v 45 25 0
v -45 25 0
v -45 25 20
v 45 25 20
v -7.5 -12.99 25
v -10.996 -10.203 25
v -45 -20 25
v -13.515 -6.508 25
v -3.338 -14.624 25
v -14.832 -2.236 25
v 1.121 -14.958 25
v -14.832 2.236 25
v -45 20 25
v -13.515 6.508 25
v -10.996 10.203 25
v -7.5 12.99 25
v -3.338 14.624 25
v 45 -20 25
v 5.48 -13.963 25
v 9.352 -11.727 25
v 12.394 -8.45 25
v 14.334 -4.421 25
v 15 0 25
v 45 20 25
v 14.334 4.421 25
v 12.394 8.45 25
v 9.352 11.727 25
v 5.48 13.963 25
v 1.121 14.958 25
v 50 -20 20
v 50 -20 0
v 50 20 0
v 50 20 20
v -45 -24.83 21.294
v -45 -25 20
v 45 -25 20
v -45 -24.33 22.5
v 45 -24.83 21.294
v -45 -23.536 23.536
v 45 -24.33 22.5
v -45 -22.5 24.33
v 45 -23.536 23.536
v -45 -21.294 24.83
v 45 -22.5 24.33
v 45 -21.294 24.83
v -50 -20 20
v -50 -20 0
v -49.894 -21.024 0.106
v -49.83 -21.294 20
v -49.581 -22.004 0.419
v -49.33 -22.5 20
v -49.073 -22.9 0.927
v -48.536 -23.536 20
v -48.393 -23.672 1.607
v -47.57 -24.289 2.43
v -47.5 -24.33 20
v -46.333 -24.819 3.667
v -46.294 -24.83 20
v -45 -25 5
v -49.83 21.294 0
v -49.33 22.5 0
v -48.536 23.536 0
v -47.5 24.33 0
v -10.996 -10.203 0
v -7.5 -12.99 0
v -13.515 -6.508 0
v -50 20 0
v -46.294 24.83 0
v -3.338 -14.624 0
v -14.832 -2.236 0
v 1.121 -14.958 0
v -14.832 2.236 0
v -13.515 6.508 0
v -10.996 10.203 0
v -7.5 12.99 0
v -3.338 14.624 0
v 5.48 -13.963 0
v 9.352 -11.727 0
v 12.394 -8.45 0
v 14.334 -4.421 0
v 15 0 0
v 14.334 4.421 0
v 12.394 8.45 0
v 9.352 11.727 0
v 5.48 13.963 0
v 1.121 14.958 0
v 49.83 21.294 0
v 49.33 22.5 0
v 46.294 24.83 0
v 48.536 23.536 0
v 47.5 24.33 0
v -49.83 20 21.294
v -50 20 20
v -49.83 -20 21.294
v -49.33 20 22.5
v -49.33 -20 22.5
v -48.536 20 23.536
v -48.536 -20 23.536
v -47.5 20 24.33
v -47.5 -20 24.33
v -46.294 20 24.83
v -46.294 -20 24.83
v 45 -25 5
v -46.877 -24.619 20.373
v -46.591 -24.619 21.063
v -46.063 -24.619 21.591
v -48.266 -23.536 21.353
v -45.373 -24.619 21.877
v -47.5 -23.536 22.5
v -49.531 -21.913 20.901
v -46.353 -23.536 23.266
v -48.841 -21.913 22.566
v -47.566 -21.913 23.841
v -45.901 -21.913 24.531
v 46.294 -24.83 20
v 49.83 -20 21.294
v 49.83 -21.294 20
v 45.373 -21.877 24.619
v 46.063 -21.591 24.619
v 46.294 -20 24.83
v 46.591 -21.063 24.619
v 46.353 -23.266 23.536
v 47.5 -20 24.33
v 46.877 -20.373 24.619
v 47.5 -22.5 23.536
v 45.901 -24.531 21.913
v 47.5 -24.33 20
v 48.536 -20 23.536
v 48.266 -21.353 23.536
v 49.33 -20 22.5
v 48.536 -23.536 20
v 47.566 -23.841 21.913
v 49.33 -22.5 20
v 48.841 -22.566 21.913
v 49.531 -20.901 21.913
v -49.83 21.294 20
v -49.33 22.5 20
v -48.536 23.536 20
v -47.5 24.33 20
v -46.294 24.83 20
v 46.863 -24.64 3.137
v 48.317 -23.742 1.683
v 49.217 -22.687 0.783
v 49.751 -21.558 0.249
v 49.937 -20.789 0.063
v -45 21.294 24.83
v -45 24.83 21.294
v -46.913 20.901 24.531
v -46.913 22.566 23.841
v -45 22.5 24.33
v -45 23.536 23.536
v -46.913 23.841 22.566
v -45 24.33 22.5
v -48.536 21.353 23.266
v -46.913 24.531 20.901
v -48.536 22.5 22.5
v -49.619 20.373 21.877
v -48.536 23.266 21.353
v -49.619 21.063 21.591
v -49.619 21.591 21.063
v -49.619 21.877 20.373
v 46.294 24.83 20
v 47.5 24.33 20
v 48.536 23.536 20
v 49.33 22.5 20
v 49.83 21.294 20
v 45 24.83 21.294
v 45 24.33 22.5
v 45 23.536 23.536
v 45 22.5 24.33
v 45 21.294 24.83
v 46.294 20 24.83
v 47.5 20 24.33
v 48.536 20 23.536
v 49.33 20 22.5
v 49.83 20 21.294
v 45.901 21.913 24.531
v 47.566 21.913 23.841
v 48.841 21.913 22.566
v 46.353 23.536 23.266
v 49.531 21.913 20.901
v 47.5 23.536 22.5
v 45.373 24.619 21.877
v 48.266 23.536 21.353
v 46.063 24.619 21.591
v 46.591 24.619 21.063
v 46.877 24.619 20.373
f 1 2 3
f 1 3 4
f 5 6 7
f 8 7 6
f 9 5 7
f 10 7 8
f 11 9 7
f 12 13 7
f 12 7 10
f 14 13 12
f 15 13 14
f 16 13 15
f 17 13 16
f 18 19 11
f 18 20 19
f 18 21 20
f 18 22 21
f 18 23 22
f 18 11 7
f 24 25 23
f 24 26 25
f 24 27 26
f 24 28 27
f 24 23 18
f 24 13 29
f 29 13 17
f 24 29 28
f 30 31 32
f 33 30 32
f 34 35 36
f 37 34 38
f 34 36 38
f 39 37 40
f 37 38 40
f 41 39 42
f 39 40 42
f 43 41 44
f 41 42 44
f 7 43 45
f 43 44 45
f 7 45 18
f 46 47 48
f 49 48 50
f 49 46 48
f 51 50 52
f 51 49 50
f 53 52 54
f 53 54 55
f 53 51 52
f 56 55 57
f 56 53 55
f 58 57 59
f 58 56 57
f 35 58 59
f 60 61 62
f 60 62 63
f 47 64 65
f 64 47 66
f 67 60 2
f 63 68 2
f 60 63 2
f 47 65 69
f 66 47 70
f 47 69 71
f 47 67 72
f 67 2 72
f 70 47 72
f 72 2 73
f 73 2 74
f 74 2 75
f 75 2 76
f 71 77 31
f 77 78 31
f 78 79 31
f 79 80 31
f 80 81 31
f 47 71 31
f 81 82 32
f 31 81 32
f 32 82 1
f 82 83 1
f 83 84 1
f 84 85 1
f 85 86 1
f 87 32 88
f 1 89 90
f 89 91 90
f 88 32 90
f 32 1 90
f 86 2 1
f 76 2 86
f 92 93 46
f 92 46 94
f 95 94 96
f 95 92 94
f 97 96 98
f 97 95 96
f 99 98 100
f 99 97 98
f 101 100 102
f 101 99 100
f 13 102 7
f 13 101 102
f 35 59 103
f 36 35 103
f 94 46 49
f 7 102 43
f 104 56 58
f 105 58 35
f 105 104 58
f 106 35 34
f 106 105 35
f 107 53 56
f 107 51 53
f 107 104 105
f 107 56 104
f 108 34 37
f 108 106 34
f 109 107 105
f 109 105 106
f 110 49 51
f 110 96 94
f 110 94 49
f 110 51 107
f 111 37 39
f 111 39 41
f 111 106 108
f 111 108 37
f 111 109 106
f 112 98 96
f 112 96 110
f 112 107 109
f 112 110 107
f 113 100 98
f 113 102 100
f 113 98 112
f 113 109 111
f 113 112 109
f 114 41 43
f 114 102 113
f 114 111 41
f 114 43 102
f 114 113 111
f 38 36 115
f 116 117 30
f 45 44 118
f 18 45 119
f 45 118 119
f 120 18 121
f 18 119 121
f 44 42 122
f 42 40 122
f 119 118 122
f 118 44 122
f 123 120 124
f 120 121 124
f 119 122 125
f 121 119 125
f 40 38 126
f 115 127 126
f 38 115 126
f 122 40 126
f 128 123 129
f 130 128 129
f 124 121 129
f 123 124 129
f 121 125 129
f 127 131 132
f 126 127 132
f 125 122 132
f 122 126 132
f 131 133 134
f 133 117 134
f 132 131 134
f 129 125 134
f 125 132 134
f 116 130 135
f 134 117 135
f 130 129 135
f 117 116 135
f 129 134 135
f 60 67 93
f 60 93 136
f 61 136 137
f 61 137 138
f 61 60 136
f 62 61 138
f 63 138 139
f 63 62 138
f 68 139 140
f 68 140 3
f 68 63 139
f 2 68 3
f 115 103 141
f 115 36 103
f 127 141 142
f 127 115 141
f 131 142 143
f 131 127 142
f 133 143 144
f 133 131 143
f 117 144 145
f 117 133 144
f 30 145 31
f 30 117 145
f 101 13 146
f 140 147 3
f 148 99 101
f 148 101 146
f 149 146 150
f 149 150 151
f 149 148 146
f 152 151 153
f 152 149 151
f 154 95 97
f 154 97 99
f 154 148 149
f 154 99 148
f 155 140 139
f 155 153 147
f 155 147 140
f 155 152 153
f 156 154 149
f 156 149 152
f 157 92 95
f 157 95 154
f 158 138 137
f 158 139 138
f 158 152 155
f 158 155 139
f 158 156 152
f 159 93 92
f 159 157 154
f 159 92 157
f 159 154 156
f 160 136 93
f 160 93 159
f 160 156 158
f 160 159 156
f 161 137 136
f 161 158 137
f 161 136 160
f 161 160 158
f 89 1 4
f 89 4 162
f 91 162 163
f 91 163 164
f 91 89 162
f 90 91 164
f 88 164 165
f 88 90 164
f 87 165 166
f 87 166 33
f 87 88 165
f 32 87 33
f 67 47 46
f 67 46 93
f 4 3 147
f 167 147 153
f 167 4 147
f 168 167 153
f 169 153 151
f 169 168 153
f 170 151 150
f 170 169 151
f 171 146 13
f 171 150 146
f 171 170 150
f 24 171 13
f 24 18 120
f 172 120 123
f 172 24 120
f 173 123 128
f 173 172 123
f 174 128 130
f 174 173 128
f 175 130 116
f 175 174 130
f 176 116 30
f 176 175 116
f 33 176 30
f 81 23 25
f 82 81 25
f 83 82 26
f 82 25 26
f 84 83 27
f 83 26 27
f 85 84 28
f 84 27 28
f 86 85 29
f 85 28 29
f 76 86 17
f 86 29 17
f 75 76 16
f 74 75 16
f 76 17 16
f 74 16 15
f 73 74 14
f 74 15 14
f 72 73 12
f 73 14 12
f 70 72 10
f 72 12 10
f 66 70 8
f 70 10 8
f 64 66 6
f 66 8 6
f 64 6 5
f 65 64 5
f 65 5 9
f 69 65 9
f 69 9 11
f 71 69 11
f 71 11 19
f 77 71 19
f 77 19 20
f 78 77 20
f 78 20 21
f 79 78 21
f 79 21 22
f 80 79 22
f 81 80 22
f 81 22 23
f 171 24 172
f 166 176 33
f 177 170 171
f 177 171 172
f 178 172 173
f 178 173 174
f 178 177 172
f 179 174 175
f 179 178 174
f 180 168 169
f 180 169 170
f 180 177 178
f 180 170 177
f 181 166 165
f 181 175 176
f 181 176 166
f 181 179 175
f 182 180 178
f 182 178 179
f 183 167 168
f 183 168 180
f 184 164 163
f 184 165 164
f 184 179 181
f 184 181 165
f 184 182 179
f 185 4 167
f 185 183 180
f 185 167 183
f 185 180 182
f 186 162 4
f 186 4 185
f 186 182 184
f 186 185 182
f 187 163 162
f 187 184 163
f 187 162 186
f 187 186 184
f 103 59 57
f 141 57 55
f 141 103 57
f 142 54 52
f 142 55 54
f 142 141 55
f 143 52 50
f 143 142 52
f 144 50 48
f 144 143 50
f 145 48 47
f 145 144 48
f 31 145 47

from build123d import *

# Parameters (mm, degrees)
F0_W        = 100
F0_H        = 50
F1_DEPTH    = 25
F2_R        = 15
F3_DEPTH    = 25.001
F4_R        = 5
F5_T1_DEPTH = 32.5
F5_S5_W     = 5
F5_S5_H     = 5
F5_T6_DEPTH = 5
F6_T1_DEPTH = 32.5
F6_S5_W     = 5
F6_S5_H     = 5
F6_T6_DEPTH = 5


# Not quite as in the source:
# - a fillet or chamfer that OpenCascade refuses, or shapes differently, is made with other operations: its cross-section is extruded or revolved along the edge and cut away or added


with BuildPart() as f1:
    # F0 (on Top) → F1 (new body)
    with BuildSketch(Plane.XY):
        Rectangle(F0_W, F0_H)
    extrude(amount=F1_DEPTH)

    # F2 (on face) → F3 (cut, through all)
    with BuildSketch(Plane.XY.offset(25)):
        Circle(F2_R)
    extrude(amount=-F3_DEPTH, mode=Mode.SUBTRACT)

    # F4
    f4_edges = [f1.edges().sort_by_distance(p)[0] for p in [
        (0, 25, 25),
        (-50, 0, 25),
        (-50, -25, 12.5),
        (50, -25, 12.5),
        (0, -25, 0),
        (0, -25, 25),
        (50, 0, 25),
    ]]
    fillet(f4_edges, radius=F4_R)

    # F5: fillet of radius 5 on 1 edges, made by hand

    # F5_s2 → F5_t1 (cut)
    with BuildSketch(Plane.XY.offset(-12.5)):
        with BuildLine():
            ThreePointArc((-50, 20), (-48.5355339059, 23.5355339059), (-45, 25))
            Line((-45, 25), (-50, 25))
            Line((-50, 25), (-50, 20))
        make_face()
    extrude(amount=F5_T1_DEPTH, mode=Mode.SUBTRACT)


with BuildPart() as f5_tool4:
    # F5_s5 → F5_t6 (new body)
    with BuildSketch(Plane.YZ.offset(-45)):
        with Locations((22.5, 22.5)):
            Rectangle(F5_S5_W, F5_S5_H)
    extrude(amount=-F5_T6_DEPTH)

    # F5_s7 → F5_t8 (revolve, cut)
    with BuildSketch(Plane(origin=(-45, 20, 20), x_dir=(0, -0.7071067812, -0.7071067812), z_dir=(0, 0.7071067812, -0.7071067812))):
        with BuildLine():
            ThreePointArc((0, -5), (5, 0), (0, 5))
            Line((0, 5), (0, -5))
        make_face()
    revolve(axis=Axis((-45, 20, 20), (-1, 0, 0)), mode=Mode.SUBTRACT)


with BuildPart() as f1_1:
    add(f1.part)

    # F5_t3: cut F5_tool4
    add(f5_tool4.part, mode=Mode.SUBTRACT)

    # F6: fillet of radius 5 on 1 edges, made by hand

    # F6_s2 → F6_t1 (cut)
    with BuildSketch(Plane.XY.offset(-12.5)):
        with BuildLine():
            ThreePointArc((45, 25), (48.5355339059, 23.5355339059), (50, 20))
            Line((50, 20), (50, 25))
            Line((50, 25), (45, 25))
        make_face()
    extrude(amount=F6_T1_DEPTH, mode=Mode.SUBTRACT)


with BuildPart() as f6_tool4:
    # F6_s5 → F6_t6 (new body)
    with BuildSketch(Plane.XZ.offset(-20)):
        with Locations((47.5, 22.5)):
            Rectangle(F6_S5_W, F6_S5_H)
    extrude(amount=-F6_T6_DEPTH)

    # F6_s7 → F6_t8 (revolve, cut)
    with BuildSketch(Plane(origin=(45, 20, 20), x_dir=(-0.7071067812, 0, -0.7071067812), z_dir=(0.7071067812, 0, -0.7071067812))):
        with BuildLine():
            ThreePointArc((0, -5), (5, 0), (0, 5))
            Line((0, 5), (0, -5))
        make_face()
    revolve(axis=Axis((45, 20, 20), (0, 1, 0)), mode=Mode.SUBTRACT)


with BuildPart() as f1_2:
    add(f1_1.part)

    # F6_t3: cut F6_tool4
    add(f6_tool4.part, mode=Mode.SUBTRACT)


solid = f1_2.part
